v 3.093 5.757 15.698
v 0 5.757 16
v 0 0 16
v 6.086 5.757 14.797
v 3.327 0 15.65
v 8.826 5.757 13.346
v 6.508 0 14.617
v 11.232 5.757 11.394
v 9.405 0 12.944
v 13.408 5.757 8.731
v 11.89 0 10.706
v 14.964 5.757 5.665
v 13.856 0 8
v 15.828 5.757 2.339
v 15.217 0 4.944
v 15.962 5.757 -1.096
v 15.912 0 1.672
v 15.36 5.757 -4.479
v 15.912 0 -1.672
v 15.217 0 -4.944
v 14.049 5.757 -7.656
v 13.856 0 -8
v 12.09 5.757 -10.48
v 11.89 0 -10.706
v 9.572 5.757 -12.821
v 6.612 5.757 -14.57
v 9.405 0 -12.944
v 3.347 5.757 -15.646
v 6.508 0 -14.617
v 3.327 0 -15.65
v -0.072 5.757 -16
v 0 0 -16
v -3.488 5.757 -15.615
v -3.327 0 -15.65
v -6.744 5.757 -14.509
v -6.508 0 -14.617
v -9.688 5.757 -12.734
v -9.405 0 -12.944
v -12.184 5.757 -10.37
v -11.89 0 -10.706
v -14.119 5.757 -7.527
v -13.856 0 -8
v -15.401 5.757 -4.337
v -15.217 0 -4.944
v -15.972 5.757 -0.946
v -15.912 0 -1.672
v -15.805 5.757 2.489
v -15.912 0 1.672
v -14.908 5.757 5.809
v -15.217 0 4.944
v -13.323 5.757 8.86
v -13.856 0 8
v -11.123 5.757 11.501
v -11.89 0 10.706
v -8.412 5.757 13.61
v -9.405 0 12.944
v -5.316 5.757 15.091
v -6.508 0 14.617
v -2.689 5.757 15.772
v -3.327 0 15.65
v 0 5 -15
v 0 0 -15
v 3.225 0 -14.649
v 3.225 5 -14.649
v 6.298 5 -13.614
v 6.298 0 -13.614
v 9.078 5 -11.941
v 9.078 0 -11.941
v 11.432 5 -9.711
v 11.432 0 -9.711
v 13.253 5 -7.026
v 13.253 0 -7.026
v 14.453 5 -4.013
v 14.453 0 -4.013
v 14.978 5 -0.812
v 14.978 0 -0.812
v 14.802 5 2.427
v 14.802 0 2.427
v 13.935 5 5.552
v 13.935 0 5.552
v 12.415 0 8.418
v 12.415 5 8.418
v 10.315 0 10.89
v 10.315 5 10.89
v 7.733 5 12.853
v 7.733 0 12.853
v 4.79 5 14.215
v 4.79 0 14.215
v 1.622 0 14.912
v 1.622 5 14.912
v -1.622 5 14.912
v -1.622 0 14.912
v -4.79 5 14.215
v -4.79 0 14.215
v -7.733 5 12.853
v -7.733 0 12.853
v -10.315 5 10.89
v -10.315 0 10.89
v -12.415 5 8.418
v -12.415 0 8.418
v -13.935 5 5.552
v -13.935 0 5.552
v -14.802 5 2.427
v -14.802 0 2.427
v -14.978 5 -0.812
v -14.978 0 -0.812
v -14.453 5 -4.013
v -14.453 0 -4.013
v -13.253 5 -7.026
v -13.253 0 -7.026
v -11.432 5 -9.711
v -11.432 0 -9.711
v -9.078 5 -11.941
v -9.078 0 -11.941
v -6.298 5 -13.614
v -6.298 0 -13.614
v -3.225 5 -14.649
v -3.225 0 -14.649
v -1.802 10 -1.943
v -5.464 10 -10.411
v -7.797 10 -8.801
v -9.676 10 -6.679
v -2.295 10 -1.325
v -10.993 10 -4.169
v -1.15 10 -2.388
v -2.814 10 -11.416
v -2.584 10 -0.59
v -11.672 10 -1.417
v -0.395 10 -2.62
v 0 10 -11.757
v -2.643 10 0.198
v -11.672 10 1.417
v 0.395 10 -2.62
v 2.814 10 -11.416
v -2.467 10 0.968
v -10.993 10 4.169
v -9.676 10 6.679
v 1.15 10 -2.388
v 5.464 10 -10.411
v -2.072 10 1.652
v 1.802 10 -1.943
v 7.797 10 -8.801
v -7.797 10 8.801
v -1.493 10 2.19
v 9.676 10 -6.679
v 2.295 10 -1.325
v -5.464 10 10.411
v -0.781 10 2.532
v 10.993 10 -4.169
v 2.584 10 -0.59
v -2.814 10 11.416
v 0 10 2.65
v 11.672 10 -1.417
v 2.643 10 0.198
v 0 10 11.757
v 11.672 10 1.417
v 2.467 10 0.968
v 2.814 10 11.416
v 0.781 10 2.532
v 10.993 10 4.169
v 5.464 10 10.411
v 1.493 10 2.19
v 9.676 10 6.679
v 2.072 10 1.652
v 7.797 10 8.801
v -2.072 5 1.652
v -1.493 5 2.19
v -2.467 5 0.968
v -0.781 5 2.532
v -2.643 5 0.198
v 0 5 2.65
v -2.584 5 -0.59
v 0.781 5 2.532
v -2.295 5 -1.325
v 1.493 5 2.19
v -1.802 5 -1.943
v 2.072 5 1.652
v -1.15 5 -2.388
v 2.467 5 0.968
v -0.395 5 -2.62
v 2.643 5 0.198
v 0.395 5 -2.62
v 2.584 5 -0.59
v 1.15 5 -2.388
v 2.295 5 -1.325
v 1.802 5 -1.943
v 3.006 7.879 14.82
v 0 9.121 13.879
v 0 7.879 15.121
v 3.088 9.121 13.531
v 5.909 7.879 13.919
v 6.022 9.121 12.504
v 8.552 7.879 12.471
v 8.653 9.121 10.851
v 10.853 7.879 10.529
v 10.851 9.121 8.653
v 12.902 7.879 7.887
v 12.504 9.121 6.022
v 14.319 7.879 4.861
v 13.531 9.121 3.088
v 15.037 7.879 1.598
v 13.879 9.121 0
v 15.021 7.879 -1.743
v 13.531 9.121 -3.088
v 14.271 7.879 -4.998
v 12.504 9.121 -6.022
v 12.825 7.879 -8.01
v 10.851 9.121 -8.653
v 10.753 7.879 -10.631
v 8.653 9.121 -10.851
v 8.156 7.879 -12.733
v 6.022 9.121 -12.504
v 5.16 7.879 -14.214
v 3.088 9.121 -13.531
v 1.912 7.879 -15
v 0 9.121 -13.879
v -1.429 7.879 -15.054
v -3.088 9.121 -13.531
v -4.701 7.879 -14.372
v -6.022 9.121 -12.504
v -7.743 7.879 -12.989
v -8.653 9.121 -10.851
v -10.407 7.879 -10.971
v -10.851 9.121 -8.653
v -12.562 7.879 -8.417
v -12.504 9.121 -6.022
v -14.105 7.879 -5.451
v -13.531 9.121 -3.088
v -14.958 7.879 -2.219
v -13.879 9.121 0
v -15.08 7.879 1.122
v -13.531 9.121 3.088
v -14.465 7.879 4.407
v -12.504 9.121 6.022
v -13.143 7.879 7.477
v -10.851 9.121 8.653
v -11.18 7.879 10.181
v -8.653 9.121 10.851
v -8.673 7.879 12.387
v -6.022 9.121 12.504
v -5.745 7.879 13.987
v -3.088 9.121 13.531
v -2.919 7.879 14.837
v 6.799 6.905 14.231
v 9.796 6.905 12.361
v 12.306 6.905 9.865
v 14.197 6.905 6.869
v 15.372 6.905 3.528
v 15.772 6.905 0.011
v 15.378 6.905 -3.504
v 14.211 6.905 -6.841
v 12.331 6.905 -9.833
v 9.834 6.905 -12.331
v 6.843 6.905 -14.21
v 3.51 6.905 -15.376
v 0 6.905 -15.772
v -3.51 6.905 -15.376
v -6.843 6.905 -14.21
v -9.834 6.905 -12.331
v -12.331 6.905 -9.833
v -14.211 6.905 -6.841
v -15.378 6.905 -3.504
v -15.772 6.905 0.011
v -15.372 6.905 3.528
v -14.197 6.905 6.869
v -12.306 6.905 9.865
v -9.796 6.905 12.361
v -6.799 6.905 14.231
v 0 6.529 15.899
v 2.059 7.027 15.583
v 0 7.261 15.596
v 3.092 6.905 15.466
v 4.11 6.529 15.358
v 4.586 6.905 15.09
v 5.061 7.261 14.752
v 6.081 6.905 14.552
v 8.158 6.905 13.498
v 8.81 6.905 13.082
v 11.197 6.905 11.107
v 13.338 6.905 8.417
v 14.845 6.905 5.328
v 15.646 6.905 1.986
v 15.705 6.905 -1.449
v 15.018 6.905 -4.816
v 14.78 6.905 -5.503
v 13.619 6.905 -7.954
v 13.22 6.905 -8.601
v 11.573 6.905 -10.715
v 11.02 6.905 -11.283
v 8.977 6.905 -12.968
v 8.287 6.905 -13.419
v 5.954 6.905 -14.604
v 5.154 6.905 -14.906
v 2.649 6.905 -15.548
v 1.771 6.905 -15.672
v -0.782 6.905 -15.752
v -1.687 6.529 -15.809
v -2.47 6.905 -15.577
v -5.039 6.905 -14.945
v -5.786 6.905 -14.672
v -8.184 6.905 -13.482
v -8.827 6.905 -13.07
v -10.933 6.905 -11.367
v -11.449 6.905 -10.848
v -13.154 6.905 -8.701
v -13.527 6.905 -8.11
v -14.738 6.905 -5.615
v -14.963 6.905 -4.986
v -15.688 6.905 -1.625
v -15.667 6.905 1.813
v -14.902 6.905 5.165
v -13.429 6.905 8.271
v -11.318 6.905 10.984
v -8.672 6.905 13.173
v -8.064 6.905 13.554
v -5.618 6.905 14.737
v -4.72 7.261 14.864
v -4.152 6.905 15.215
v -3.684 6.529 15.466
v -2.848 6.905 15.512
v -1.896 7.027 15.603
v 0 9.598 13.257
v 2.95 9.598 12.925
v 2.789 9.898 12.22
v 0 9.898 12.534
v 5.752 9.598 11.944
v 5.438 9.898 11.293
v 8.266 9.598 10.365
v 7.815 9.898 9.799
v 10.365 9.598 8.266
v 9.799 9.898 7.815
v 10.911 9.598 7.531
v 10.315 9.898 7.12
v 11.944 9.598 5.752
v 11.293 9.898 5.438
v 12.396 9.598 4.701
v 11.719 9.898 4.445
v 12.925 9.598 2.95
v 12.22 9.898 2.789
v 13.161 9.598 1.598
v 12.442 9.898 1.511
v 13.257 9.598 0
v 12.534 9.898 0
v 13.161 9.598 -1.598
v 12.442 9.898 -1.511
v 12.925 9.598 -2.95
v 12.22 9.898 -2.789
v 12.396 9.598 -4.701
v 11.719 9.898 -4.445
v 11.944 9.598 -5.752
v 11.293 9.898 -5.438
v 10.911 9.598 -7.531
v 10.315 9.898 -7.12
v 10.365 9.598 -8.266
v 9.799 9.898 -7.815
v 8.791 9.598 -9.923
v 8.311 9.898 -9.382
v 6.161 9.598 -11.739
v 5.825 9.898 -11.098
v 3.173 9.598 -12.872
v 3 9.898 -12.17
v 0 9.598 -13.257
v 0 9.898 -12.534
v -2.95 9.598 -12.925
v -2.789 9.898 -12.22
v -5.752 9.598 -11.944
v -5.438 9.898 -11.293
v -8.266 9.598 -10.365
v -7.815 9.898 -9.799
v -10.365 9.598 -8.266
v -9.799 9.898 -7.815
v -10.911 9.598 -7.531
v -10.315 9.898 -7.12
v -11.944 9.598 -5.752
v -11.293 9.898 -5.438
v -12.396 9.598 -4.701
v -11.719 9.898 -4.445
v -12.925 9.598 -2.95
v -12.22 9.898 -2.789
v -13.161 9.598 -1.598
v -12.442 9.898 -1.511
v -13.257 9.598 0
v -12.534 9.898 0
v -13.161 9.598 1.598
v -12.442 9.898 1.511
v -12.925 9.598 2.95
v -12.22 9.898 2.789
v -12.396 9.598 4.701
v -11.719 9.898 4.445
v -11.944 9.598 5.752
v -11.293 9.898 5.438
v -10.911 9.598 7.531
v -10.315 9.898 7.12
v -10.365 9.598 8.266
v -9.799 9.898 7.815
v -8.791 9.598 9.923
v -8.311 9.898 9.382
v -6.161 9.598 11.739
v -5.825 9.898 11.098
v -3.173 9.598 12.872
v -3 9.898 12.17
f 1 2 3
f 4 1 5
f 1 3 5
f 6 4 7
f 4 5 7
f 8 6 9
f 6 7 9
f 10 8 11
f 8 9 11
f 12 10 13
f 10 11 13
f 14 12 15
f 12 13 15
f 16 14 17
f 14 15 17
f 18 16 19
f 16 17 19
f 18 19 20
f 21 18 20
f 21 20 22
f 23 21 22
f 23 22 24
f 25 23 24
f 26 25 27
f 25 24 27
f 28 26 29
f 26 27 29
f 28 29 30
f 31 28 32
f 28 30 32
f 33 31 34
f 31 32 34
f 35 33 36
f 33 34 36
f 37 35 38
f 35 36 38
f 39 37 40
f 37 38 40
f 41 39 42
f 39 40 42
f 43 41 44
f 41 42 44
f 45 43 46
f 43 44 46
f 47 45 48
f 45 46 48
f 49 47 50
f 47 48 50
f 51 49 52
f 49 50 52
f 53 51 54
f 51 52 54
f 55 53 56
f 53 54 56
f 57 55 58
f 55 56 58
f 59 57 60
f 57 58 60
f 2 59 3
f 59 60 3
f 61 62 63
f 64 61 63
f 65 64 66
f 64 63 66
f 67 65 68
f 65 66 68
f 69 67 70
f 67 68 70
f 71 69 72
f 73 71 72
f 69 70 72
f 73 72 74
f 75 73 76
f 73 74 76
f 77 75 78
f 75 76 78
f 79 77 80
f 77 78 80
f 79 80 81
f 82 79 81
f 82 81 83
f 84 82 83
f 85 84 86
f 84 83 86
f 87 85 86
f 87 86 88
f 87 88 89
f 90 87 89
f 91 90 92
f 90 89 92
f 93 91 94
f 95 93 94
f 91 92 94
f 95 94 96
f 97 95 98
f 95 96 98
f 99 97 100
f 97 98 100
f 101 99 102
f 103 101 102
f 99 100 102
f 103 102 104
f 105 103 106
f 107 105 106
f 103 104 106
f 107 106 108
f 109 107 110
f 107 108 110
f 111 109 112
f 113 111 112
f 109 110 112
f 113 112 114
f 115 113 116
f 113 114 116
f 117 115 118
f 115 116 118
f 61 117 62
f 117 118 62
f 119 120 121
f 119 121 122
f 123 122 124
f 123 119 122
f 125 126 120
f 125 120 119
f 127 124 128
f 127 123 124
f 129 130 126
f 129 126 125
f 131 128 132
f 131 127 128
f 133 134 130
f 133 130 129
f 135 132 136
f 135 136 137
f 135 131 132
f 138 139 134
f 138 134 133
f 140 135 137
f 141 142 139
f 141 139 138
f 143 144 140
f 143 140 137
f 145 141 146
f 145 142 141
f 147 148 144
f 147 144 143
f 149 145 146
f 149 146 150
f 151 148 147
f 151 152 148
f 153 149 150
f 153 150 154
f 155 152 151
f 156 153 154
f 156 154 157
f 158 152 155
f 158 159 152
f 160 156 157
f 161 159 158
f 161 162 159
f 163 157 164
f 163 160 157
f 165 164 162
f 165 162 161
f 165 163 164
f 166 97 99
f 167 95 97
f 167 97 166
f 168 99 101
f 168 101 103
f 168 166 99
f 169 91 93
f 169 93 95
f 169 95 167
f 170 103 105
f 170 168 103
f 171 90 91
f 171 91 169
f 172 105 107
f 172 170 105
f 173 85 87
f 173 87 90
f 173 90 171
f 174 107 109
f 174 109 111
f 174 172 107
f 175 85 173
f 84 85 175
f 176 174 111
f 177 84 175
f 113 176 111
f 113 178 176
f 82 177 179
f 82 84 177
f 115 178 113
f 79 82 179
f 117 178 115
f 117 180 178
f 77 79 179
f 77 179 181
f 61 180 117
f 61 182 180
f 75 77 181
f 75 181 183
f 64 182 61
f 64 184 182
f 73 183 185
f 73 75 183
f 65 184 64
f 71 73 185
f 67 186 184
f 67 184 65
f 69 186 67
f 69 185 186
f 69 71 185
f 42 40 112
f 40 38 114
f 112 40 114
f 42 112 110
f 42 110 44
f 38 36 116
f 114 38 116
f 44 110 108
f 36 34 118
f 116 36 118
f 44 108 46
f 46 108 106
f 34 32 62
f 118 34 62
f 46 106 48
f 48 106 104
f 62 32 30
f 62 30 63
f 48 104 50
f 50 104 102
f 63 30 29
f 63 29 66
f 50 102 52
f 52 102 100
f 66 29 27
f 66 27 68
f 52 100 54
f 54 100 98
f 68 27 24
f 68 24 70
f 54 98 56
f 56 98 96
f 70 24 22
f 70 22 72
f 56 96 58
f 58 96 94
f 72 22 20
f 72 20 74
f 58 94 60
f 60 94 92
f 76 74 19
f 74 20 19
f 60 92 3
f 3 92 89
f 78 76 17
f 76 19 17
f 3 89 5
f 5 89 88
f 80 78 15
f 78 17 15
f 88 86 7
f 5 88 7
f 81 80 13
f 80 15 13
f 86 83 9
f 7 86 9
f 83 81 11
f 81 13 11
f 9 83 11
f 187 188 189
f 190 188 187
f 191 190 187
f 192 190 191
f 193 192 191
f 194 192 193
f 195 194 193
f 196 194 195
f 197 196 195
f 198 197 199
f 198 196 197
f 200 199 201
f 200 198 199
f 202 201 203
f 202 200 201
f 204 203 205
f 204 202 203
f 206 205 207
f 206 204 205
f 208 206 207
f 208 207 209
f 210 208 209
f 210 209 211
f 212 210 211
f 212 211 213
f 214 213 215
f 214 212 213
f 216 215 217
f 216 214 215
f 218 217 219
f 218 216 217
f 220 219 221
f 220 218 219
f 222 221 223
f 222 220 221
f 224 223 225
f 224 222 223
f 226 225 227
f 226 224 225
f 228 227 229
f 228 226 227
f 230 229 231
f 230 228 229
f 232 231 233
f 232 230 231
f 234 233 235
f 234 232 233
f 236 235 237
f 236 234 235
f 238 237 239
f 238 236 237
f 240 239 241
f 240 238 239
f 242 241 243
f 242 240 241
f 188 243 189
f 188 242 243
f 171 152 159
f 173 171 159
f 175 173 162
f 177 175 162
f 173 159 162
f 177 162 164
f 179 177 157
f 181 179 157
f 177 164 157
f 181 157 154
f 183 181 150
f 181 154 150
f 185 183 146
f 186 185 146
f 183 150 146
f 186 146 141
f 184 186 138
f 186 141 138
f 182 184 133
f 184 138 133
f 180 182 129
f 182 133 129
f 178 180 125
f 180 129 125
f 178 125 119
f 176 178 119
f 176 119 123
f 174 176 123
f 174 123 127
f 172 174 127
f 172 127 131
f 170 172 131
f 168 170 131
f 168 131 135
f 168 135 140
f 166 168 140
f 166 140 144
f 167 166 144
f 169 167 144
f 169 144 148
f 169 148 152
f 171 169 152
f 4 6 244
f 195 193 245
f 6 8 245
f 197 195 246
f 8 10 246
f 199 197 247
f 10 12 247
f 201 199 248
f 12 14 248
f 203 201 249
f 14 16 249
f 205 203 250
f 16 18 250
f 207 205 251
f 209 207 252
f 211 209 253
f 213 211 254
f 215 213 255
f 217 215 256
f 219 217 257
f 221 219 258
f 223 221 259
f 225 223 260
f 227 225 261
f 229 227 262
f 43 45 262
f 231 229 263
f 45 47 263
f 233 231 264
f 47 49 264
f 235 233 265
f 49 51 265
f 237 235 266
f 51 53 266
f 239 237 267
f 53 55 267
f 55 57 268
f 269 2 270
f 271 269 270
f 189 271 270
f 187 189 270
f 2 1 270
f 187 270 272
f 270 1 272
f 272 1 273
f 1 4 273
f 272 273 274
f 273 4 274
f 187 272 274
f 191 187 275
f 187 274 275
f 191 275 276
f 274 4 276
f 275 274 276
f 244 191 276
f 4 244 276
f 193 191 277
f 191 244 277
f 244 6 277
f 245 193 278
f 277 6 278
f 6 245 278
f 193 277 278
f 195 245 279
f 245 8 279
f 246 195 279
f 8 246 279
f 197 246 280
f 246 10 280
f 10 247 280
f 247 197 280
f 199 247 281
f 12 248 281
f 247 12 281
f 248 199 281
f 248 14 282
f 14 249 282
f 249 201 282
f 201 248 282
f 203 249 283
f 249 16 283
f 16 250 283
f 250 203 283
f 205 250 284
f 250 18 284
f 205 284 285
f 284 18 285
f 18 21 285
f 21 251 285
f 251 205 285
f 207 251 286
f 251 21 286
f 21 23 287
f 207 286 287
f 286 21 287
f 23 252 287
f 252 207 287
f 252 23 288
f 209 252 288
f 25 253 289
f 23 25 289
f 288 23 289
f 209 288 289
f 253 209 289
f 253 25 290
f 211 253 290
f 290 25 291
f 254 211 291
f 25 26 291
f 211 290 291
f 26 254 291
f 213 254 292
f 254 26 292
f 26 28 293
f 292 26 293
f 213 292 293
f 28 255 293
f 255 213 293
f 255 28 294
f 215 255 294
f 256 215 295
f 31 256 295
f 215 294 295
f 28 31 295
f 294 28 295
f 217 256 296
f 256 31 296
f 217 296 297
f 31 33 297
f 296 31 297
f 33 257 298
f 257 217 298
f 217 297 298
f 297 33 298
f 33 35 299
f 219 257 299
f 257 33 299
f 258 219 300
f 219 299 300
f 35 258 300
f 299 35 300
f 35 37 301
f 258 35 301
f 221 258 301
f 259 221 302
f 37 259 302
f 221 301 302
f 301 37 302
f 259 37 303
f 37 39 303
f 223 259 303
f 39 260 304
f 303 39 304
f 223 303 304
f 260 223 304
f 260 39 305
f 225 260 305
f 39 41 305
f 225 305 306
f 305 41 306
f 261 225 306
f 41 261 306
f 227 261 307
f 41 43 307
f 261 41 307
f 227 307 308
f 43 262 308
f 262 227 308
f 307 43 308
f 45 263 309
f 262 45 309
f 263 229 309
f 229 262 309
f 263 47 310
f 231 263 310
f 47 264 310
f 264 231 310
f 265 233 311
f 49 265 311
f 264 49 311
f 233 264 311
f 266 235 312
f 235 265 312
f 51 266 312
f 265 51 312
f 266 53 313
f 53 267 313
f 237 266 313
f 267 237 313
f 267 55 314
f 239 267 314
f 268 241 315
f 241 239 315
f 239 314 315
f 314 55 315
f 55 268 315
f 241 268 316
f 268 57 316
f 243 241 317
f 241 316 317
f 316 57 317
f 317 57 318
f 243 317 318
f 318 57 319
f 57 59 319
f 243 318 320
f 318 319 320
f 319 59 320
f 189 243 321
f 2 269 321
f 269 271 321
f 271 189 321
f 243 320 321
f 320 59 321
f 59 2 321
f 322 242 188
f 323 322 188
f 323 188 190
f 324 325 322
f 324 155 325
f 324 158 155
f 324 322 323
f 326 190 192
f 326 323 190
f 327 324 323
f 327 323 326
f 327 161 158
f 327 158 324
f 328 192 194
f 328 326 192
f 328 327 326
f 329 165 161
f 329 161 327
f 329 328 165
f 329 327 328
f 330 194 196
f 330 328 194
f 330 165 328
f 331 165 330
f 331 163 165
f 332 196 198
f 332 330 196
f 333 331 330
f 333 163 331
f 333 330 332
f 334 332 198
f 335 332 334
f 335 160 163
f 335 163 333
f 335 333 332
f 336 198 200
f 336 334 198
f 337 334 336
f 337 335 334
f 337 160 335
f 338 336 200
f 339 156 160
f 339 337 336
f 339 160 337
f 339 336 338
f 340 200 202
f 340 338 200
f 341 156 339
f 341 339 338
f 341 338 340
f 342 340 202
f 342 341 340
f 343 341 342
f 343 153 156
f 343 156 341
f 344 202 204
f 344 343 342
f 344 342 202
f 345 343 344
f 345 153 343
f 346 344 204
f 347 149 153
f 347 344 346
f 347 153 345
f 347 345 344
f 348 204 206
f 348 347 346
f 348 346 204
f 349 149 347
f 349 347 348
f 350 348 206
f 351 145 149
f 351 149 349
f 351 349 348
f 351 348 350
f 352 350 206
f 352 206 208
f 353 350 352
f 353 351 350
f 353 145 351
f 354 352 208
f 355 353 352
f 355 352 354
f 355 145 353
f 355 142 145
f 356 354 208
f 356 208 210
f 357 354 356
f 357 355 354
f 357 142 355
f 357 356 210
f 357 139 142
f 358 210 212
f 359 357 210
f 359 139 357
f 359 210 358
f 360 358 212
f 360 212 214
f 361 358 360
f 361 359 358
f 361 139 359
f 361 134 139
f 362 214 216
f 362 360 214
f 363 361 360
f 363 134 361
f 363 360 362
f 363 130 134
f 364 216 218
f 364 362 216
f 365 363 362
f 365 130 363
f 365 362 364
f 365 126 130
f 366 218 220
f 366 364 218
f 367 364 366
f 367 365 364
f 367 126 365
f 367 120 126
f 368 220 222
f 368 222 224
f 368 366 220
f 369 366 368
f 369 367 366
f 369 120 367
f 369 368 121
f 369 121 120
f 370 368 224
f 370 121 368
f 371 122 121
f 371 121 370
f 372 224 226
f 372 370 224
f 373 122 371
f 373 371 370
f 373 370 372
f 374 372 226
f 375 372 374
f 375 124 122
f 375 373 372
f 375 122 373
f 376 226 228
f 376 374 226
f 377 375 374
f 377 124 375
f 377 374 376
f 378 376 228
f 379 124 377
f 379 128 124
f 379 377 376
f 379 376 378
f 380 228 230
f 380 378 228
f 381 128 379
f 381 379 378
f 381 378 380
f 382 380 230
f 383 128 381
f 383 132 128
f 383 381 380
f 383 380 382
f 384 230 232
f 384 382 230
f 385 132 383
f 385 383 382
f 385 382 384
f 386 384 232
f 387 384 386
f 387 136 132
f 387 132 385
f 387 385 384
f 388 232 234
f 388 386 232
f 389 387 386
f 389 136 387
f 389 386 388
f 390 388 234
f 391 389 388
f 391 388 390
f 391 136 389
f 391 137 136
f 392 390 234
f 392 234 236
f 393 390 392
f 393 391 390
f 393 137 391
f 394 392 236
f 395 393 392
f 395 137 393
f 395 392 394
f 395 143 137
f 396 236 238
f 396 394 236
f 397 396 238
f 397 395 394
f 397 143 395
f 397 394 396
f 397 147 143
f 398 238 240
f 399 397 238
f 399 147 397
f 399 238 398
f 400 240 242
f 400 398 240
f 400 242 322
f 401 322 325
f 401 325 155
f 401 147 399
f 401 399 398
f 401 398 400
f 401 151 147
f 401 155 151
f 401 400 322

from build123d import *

# Parameters (mm, degrees)
SKETCH1_R           = 16
BOSS_EXTRUDE1_DEPTH = 10
CHAMFER1_SIZE       = 3
FILLET1_R           = 3
SKETCH2_R           = 2.65
CUT_EXTRUDE1_DEPTH  = 10
SKETCH3_R           = 15
CUT_EXTRUDE2_DEPTH  = 5


with BuildPart() as part:
    # Sketch1 → Boss-Extrude1 (new body)
    with BuildSketch(Plane(origin=(0, 0, 0), x_dir=(1, 0, 0), z_dir=(0, 1, 0))):
        with Locations(Location((0, 0, 0), (0, 0, 270))):
            Circle(SKETCH1_R)
    extrude(amount=BOSS_EXTRUDE1_DEPTH)

    # Chamfer1
    chamfer1_edges = [part.edges().sort_by_distance(p)[0] for p in [
        (0, 10, -16),
    ]]
    chamfer(chamfer1_edges, length=CHAMFER1_SIZE)

    # Fillet1
    fillet1_edges = [part.edges().sort_by_distance(p)[0] for p in [
        (0, 10, -13),
        (0, 7, -16),
    ]]
    fillet(fillet1_edges, radius=FILLET1_R)

    # Sketch2 → Cut-Extrude1 (cut)
    with BuildSketch(Plane(origin=(0, 10, 0), x_dir=(1, 0, 0), z_dir=(0, 1, 0))):
        with Locations(Location((0, 0, 0), (0, 0, 270))):
            Circle(SKETCH2_R)
    extrude(amount=-CUT_EXTRUDE1_DEPTH, mode=Mode.SUBTRACT)

    # Sketch3 → Cut-Extrude2 (cut)
    with BuildSketch(Plane.XZ):
        with Locations(Location((0, 0, 0), (0, 0, 270))):
            Circle(SKETCH3_R)
    extrude(amount=-CUT_EXTRUDE2_DEPTH, mode=Mode.SUBTRACT)


solid = part.part
